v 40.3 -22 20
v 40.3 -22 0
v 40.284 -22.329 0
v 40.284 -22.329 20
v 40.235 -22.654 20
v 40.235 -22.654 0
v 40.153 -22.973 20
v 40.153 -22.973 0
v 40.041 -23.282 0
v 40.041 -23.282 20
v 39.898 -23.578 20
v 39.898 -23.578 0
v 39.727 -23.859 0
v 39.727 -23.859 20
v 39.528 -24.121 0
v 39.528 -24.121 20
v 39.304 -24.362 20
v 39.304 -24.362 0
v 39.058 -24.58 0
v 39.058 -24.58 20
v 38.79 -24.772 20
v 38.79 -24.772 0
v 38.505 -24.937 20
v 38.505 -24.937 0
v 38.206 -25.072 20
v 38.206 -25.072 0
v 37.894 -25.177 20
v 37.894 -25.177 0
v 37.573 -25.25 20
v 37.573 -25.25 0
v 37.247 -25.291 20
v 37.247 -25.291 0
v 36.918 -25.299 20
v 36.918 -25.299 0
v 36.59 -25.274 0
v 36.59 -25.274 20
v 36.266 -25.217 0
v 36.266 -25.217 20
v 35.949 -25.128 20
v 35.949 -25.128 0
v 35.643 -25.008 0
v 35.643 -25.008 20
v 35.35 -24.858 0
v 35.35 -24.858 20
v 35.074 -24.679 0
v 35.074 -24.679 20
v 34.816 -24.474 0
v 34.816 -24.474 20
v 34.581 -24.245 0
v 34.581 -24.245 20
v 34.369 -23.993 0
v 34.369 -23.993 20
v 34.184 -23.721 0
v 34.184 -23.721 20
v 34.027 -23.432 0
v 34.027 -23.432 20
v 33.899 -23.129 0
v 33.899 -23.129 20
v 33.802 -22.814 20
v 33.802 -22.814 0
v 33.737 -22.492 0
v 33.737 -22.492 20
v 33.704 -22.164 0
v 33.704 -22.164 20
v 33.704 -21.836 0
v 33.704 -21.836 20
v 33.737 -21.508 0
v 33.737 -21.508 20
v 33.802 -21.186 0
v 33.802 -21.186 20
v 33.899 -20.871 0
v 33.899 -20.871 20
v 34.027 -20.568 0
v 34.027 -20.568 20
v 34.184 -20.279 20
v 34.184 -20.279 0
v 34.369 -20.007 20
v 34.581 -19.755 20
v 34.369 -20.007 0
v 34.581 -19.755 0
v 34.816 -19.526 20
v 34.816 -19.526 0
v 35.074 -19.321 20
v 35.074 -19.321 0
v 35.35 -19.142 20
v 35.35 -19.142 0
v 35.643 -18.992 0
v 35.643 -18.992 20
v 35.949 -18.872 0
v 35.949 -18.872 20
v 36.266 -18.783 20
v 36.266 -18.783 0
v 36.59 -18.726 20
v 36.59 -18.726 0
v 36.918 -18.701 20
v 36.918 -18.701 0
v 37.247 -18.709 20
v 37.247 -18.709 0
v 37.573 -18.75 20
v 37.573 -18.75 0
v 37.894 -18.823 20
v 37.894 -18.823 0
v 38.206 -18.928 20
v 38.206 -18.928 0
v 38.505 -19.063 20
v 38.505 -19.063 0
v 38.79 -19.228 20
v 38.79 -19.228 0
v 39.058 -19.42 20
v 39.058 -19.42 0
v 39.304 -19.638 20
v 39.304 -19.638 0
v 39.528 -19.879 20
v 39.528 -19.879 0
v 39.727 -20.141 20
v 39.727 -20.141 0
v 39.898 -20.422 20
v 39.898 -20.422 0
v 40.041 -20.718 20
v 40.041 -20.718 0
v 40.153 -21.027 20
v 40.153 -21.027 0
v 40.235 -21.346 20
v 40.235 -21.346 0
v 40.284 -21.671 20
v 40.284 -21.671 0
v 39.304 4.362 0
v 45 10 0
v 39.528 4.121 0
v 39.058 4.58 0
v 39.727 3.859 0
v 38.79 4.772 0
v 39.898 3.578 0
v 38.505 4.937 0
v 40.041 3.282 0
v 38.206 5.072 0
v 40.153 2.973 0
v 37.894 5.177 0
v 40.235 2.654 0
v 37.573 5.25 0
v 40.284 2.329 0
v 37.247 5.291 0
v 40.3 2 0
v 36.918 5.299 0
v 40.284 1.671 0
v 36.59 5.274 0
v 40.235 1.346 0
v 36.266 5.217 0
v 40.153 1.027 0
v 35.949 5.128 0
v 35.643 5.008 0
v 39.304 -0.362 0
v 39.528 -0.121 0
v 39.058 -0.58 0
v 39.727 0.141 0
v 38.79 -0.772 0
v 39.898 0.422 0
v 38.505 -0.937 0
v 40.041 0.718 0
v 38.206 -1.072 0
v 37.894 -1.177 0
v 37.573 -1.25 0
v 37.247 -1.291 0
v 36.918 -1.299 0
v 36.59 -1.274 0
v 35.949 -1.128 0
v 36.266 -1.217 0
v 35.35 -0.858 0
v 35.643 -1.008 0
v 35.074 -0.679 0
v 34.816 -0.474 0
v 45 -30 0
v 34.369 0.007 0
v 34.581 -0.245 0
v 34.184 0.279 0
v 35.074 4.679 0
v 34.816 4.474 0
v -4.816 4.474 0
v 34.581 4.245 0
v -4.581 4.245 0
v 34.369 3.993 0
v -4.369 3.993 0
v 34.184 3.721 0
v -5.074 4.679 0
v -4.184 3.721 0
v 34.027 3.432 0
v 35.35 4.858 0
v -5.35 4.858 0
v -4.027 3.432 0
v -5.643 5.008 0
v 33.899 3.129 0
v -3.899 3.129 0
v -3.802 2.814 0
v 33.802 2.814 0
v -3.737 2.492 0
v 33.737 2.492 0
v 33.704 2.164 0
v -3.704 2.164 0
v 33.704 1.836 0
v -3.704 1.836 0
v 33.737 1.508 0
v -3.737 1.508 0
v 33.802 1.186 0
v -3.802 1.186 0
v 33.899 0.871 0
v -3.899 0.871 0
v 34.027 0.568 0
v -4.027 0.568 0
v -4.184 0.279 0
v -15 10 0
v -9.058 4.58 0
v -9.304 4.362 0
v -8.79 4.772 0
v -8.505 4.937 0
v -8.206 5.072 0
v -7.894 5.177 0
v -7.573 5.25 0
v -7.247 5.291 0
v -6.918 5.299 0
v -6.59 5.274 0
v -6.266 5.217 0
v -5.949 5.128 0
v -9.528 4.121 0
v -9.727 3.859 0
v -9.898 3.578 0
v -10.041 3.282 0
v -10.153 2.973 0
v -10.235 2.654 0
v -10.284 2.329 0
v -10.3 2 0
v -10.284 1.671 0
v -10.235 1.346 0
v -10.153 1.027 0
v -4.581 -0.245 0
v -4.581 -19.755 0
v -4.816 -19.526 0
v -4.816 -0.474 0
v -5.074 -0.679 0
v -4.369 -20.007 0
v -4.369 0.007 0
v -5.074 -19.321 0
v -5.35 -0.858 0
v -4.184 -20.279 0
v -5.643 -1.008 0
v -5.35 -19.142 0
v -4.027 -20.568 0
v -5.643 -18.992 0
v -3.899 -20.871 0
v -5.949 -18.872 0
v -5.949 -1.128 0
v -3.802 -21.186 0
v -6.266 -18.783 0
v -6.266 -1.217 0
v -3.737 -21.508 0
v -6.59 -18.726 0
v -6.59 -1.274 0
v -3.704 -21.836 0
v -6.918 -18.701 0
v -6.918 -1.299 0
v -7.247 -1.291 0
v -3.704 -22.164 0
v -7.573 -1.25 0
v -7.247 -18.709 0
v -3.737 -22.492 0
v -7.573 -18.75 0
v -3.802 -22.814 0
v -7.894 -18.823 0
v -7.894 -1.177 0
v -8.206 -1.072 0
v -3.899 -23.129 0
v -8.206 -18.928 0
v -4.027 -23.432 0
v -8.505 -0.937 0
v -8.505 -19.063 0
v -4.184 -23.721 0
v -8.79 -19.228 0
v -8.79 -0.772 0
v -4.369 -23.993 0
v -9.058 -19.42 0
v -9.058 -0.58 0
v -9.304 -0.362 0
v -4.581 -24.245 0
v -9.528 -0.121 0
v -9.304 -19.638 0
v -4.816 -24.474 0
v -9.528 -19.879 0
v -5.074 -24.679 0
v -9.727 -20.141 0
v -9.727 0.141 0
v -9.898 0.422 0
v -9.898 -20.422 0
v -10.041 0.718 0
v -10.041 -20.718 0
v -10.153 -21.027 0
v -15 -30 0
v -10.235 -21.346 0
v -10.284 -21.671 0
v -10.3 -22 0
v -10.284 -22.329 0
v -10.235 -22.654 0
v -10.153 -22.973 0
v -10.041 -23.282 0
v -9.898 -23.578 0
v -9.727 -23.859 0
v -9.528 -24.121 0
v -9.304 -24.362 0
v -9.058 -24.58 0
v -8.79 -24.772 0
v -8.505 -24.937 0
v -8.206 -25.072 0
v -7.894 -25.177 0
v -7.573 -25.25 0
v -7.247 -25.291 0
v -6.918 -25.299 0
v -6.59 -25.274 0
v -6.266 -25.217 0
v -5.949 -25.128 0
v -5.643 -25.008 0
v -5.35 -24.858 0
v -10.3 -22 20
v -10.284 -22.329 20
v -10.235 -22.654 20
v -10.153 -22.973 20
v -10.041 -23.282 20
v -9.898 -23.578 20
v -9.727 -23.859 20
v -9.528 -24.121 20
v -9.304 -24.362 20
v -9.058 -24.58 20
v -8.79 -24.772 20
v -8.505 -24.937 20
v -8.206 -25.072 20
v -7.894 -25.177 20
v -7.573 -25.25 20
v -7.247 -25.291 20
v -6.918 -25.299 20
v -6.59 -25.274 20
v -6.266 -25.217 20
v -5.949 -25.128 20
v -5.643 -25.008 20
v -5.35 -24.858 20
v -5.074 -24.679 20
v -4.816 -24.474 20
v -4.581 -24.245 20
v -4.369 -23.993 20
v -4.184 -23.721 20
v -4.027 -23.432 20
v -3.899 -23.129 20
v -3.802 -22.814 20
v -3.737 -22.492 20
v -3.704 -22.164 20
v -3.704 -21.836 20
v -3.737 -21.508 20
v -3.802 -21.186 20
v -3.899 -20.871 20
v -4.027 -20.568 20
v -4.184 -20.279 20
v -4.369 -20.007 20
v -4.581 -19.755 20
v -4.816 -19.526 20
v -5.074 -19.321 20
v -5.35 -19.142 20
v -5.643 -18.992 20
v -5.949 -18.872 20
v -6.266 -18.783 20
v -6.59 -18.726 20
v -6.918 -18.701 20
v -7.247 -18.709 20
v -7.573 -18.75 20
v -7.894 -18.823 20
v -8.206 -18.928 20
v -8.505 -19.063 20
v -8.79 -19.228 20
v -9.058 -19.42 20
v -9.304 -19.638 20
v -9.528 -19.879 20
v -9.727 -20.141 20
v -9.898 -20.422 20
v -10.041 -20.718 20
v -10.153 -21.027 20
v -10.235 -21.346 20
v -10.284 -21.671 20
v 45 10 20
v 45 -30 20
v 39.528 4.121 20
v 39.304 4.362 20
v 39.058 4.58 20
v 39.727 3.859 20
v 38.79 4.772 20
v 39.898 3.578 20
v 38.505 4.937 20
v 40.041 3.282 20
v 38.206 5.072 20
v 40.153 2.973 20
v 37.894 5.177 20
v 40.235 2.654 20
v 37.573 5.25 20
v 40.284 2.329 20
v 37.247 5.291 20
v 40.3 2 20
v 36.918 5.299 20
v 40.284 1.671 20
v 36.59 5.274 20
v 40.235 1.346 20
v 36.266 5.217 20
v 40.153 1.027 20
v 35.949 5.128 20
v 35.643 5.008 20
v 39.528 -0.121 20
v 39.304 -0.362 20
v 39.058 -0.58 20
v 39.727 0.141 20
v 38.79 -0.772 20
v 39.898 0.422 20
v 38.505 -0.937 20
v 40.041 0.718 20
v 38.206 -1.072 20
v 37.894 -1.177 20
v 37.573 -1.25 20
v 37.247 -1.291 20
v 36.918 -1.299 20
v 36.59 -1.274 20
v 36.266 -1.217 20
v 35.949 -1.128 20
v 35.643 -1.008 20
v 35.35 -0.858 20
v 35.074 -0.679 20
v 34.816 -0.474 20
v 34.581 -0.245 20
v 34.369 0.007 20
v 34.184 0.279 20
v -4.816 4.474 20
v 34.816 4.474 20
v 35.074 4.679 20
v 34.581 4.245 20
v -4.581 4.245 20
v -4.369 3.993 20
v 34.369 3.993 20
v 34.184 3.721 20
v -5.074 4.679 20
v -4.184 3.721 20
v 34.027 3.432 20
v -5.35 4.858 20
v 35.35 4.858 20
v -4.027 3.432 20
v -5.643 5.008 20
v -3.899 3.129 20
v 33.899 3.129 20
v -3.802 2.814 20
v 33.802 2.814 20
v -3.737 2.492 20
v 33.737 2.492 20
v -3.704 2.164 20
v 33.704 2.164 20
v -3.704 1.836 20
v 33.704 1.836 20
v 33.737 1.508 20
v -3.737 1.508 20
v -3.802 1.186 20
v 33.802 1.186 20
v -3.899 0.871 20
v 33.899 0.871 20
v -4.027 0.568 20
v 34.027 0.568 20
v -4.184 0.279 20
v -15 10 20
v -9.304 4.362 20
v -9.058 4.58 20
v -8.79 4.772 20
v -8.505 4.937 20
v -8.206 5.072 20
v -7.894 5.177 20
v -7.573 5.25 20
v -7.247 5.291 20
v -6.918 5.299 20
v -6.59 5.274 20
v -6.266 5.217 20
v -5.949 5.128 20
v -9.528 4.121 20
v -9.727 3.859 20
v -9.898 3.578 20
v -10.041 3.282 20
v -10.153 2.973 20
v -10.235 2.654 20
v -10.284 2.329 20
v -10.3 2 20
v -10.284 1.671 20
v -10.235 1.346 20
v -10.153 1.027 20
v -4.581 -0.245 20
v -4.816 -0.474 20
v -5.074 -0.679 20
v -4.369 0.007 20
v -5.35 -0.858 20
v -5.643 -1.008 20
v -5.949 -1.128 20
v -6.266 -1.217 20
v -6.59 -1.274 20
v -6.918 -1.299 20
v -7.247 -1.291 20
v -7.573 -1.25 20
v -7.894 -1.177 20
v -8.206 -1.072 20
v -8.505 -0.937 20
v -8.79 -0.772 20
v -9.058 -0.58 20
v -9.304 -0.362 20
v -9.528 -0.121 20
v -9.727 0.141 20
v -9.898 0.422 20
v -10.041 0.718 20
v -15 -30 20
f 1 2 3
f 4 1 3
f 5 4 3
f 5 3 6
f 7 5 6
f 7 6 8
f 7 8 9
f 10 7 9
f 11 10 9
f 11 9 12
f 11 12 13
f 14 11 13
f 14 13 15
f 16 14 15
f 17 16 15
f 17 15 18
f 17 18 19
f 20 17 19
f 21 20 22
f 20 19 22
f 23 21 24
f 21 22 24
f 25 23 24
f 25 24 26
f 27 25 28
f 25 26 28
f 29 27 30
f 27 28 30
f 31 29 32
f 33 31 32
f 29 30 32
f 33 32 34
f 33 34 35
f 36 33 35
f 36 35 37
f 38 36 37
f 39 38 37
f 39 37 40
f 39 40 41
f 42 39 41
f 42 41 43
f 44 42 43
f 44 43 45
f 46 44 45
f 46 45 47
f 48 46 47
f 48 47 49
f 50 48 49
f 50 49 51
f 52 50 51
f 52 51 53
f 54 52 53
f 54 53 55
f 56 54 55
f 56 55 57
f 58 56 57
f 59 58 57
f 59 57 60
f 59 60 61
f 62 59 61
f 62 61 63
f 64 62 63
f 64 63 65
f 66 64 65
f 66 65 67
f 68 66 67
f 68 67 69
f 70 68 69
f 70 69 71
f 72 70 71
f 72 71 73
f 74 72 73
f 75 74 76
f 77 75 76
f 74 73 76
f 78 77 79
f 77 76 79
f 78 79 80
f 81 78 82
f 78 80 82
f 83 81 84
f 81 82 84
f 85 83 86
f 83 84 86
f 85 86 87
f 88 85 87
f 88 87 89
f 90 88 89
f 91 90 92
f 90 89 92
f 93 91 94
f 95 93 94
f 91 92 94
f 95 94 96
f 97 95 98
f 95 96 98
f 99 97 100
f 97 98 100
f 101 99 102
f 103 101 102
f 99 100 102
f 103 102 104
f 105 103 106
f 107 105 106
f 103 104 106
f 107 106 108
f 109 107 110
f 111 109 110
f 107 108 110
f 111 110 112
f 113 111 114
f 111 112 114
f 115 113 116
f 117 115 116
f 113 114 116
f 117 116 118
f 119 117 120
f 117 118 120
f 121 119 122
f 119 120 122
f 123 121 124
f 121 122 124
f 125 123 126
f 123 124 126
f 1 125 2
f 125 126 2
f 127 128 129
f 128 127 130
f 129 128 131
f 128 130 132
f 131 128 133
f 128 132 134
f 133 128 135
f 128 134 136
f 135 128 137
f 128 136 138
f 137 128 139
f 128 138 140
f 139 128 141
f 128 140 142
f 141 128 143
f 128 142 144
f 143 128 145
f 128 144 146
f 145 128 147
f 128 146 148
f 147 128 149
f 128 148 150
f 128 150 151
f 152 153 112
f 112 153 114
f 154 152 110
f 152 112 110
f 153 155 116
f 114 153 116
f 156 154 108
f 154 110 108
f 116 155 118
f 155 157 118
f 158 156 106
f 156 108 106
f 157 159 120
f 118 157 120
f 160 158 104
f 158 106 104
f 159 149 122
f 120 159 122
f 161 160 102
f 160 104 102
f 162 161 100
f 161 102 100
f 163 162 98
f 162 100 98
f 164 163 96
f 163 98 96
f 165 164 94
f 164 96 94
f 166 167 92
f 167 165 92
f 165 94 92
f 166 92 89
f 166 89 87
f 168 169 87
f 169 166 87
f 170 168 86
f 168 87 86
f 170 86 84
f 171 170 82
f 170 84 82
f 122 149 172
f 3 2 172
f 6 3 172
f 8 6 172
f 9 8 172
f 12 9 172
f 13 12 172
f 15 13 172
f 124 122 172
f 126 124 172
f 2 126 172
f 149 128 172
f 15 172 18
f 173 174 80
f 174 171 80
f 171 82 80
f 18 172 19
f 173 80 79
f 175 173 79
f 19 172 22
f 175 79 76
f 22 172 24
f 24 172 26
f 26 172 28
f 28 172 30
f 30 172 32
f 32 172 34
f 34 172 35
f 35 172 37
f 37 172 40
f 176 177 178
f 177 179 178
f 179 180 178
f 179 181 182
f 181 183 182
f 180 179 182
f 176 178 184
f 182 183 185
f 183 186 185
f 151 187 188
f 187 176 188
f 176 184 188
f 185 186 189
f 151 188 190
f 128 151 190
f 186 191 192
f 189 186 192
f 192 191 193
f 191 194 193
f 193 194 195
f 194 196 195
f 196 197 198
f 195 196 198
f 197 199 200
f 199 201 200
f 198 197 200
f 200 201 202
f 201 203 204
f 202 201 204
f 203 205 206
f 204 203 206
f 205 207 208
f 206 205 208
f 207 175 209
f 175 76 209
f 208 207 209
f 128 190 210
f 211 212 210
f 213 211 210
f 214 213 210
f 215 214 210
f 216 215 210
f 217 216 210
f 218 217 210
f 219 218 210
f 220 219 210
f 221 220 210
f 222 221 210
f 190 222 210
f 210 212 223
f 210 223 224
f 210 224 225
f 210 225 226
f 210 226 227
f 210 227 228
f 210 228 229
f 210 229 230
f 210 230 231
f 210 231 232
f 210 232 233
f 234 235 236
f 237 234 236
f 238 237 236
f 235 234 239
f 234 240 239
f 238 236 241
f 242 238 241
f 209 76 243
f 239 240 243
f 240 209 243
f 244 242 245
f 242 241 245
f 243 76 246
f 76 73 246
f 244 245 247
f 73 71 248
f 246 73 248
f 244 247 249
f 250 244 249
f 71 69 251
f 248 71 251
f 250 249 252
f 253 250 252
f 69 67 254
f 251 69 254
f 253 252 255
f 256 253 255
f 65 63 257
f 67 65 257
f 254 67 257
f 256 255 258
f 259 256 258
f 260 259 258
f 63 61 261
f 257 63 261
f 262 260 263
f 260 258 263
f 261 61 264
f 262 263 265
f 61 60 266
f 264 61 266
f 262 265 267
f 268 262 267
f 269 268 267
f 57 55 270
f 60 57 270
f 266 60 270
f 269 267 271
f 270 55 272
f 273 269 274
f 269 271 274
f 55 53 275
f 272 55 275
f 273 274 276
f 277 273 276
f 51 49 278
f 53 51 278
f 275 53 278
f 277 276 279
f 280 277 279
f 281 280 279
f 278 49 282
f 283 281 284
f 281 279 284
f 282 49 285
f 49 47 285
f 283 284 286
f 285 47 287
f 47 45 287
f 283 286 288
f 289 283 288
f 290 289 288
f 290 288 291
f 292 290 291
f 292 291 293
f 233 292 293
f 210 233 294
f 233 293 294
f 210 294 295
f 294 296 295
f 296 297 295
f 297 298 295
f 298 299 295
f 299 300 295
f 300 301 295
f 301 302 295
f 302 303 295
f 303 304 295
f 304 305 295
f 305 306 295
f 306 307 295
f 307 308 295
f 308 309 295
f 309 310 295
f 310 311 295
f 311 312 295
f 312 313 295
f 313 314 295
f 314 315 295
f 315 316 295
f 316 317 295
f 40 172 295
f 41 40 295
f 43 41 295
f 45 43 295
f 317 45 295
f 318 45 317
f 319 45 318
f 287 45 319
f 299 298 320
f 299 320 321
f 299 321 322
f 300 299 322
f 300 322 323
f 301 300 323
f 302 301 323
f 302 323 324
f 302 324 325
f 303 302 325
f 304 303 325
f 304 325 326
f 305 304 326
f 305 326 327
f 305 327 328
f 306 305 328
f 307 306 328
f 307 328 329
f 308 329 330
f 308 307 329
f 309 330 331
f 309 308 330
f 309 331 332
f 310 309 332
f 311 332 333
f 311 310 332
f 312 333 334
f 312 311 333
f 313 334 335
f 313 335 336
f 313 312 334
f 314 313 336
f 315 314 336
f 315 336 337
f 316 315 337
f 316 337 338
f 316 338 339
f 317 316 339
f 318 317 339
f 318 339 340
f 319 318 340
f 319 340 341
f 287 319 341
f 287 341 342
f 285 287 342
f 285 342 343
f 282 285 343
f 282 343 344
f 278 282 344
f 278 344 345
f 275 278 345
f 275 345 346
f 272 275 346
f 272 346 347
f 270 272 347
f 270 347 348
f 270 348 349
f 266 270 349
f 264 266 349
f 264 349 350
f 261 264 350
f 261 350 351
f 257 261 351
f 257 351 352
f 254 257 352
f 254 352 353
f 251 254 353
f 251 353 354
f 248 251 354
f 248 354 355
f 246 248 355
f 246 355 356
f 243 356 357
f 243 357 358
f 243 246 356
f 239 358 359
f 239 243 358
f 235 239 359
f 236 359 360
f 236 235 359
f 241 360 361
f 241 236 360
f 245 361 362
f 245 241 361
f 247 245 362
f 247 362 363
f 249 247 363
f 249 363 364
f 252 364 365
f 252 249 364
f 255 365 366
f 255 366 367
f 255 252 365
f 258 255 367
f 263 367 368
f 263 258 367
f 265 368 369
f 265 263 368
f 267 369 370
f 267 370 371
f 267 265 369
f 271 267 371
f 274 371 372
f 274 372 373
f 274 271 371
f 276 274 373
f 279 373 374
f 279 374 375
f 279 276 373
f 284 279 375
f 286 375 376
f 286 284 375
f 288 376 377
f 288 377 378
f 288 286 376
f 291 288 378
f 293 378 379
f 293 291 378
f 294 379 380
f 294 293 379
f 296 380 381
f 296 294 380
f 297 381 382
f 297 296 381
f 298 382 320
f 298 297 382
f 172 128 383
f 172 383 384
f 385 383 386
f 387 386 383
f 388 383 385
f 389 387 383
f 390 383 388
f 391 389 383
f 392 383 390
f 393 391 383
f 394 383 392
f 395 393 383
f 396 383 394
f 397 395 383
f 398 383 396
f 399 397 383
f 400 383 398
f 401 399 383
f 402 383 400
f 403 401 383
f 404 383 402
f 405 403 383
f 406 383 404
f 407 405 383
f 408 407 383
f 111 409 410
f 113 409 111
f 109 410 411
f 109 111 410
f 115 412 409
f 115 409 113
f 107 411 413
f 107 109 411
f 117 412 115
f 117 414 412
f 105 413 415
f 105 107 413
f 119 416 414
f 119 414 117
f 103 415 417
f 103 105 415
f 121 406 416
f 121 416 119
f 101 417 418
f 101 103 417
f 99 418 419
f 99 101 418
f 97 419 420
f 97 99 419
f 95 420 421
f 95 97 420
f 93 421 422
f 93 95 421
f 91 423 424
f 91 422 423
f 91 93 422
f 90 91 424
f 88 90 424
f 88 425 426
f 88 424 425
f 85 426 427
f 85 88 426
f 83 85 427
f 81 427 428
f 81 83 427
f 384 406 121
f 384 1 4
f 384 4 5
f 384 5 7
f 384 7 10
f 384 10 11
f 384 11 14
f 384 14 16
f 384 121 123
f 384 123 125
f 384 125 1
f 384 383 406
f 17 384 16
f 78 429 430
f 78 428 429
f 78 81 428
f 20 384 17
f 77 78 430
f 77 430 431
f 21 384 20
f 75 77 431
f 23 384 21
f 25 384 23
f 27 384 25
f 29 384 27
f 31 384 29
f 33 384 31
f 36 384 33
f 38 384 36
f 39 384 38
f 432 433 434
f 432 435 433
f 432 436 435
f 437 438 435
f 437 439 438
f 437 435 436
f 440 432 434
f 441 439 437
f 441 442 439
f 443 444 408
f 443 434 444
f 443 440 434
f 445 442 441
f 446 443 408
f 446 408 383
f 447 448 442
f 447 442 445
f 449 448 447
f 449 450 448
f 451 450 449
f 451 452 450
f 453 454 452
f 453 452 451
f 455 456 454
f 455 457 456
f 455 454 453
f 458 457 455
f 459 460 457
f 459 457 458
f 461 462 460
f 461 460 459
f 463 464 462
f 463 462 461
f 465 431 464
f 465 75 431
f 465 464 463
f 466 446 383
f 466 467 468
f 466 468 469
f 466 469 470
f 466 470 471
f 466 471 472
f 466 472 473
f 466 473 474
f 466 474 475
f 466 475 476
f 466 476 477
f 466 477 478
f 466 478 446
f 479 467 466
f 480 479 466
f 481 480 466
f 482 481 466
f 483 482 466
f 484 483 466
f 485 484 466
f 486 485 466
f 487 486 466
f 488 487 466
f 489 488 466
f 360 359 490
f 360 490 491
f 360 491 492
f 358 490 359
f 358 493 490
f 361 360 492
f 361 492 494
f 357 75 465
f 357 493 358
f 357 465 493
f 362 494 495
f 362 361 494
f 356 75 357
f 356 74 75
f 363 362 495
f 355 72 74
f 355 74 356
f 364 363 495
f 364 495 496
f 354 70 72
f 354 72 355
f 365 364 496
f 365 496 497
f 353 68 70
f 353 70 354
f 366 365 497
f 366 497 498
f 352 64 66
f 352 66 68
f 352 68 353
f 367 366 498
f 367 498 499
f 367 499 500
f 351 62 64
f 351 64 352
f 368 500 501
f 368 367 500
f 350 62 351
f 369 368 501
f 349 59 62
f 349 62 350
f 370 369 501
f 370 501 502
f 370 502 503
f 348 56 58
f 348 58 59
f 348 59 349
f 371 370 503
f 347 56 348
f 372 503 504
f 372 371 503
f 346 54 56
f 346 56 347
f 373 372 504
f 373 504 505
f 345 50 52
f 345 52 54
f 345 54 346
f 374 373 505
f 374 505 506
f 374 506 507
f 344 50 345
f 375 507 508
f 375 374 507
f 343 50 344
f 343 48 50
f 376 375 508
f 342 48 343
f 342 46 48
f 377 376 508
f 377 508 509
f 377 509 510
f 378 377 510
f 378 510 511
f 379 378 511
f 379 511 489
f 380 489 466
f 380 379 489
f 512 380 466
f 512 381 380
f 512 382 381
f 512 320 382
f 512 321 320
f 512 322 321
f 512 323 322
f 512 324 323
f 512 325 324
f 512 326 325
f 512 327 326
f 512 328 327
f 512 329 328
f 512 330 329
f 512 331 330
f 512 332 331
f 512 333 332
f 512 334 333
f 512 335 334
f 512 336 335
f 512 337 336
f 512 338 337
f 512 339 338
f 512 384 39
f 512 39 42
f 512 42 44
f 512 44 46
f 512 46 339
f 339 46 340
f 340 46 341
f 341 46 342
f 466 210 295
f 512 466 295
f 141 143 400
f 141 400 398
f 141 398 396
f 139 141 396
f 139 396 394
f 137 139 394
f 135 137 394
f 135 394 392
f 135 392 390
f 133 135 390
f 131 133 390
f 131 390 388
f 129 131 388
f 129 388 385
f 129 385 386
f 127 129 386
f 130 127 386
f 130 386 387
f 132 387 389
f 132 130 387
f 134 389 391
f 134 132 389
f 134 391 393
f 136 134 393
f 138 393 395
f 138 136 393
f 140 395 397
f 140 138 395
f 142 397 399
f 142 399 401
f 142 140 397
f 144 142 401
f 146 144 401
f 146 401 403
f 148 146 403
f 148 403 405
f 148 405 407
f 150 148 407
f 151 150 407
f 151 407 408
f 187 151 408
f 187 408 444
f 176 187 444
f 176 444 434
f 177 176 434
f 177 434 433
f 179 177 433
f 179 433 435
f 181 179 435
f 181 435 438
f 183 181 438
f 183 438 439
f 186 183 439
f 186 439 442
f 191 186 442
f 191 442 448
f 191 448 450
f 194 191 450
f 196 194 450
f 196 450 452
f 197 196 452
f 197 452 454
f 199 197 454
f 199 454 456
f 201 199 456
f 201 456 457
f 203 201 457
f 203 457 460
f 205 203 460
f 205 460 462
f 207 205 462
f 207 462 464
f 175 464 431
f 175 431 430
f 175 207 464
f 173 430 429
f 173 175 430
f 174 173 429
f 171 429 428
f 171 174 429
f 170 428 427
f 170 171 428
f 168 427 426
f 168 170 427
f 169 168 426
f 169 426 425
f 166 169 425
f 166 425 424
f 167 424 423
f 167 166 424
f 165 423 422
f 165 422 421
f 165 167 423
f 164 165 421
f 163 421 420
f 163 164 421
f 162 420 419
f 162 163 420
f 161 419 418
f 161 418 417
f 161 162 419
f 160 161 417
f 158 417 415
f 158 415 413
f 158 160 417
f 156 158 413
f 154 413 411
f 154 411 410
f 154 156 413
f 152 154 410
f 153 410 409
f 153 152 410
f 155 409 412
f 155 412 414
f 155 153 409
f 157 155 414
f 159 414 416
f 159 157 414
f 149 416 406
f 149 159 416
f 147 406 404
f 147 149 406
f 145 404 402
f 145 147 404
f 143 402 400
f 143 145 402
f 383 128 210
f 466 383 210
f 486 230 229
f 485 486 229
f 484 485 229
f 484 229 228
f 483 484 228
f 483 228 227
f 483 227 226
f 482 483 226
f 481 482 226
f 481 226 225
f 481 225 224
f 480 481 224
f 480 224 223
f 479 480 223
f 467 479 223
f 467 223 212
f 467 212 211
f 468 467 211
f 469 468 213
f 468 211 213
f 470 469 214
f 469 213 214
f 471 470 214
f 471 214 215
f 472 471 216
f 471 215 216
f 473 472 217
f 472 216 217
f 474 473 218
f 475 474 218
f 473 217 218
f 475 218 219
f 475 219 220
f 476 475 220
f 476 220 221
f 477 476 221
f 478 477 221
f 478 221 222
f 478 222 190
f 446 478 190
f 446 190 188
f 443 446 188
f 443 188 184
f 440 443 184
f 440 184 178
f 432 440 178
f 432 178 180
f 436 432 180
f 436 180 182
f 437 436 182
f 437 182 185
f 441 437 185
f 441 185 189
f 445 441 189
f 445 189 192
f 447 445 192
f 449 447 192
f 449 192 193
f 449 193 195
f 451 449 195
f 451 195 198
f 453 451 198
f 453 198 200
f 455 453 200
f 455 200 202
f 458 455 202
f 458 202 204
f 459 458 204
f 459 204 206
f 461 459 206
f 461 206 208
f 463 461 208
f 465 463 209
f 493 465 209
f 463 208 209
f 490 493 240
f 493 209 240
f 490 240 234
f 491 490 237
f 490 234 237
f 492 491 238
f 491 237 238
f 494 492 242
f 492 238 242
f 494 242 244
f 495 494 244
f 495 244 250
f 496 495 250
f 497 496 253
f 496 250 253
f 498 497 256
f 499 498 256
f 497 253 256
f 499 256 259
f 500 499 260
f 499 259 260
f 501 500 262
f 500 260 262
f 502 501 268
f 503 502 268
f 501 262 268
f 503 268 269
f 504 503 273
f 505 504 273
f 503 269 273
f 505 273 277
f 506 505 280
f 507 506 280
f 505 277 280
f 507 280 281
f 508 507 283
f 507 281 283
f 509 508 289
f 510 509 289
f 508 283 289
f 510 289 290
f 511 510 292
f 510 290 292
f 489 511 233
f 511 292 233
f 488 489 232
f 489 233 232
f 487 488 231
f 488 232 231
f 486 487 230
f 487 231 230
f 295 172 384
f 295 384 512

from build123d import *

# Parameters (mm, degrees)
F0_W     = 30
F0_H     = 20
F1_DEPTH = 20
F3_D     = 6.6


with BuildPart() as f1:
    # F0 (on Top) → F1 (new body)
    with BuildSketch(Plane.XY):
        Rectangle(F0_W, F0_H)
    extrude(amount=F1_DEPTH)

    # F3 (through all)
    with Locations(Plane.XY.offset(20)):
        with Locations((-7, 2)):
            Hole(F3_D / 2)

    # F4: F1 across face


with BuildPart() as f1_1:
    add(f1.part)
    add(f1.part.mirror(Plane(origin=(15, 0, 10), x_dir=(0, 1, 0), z_dir=(1, 0, 0))))

    # F5: F1 across face


with BuildPart() as f1_2:
    add(f1_1.part)
    add(f1_1.part.mirror(Plane(origin=(15, -10, 10), x_dir=(1, 0, 0), z_dir=(0, -1, 0))))


solid = f1_2.part
